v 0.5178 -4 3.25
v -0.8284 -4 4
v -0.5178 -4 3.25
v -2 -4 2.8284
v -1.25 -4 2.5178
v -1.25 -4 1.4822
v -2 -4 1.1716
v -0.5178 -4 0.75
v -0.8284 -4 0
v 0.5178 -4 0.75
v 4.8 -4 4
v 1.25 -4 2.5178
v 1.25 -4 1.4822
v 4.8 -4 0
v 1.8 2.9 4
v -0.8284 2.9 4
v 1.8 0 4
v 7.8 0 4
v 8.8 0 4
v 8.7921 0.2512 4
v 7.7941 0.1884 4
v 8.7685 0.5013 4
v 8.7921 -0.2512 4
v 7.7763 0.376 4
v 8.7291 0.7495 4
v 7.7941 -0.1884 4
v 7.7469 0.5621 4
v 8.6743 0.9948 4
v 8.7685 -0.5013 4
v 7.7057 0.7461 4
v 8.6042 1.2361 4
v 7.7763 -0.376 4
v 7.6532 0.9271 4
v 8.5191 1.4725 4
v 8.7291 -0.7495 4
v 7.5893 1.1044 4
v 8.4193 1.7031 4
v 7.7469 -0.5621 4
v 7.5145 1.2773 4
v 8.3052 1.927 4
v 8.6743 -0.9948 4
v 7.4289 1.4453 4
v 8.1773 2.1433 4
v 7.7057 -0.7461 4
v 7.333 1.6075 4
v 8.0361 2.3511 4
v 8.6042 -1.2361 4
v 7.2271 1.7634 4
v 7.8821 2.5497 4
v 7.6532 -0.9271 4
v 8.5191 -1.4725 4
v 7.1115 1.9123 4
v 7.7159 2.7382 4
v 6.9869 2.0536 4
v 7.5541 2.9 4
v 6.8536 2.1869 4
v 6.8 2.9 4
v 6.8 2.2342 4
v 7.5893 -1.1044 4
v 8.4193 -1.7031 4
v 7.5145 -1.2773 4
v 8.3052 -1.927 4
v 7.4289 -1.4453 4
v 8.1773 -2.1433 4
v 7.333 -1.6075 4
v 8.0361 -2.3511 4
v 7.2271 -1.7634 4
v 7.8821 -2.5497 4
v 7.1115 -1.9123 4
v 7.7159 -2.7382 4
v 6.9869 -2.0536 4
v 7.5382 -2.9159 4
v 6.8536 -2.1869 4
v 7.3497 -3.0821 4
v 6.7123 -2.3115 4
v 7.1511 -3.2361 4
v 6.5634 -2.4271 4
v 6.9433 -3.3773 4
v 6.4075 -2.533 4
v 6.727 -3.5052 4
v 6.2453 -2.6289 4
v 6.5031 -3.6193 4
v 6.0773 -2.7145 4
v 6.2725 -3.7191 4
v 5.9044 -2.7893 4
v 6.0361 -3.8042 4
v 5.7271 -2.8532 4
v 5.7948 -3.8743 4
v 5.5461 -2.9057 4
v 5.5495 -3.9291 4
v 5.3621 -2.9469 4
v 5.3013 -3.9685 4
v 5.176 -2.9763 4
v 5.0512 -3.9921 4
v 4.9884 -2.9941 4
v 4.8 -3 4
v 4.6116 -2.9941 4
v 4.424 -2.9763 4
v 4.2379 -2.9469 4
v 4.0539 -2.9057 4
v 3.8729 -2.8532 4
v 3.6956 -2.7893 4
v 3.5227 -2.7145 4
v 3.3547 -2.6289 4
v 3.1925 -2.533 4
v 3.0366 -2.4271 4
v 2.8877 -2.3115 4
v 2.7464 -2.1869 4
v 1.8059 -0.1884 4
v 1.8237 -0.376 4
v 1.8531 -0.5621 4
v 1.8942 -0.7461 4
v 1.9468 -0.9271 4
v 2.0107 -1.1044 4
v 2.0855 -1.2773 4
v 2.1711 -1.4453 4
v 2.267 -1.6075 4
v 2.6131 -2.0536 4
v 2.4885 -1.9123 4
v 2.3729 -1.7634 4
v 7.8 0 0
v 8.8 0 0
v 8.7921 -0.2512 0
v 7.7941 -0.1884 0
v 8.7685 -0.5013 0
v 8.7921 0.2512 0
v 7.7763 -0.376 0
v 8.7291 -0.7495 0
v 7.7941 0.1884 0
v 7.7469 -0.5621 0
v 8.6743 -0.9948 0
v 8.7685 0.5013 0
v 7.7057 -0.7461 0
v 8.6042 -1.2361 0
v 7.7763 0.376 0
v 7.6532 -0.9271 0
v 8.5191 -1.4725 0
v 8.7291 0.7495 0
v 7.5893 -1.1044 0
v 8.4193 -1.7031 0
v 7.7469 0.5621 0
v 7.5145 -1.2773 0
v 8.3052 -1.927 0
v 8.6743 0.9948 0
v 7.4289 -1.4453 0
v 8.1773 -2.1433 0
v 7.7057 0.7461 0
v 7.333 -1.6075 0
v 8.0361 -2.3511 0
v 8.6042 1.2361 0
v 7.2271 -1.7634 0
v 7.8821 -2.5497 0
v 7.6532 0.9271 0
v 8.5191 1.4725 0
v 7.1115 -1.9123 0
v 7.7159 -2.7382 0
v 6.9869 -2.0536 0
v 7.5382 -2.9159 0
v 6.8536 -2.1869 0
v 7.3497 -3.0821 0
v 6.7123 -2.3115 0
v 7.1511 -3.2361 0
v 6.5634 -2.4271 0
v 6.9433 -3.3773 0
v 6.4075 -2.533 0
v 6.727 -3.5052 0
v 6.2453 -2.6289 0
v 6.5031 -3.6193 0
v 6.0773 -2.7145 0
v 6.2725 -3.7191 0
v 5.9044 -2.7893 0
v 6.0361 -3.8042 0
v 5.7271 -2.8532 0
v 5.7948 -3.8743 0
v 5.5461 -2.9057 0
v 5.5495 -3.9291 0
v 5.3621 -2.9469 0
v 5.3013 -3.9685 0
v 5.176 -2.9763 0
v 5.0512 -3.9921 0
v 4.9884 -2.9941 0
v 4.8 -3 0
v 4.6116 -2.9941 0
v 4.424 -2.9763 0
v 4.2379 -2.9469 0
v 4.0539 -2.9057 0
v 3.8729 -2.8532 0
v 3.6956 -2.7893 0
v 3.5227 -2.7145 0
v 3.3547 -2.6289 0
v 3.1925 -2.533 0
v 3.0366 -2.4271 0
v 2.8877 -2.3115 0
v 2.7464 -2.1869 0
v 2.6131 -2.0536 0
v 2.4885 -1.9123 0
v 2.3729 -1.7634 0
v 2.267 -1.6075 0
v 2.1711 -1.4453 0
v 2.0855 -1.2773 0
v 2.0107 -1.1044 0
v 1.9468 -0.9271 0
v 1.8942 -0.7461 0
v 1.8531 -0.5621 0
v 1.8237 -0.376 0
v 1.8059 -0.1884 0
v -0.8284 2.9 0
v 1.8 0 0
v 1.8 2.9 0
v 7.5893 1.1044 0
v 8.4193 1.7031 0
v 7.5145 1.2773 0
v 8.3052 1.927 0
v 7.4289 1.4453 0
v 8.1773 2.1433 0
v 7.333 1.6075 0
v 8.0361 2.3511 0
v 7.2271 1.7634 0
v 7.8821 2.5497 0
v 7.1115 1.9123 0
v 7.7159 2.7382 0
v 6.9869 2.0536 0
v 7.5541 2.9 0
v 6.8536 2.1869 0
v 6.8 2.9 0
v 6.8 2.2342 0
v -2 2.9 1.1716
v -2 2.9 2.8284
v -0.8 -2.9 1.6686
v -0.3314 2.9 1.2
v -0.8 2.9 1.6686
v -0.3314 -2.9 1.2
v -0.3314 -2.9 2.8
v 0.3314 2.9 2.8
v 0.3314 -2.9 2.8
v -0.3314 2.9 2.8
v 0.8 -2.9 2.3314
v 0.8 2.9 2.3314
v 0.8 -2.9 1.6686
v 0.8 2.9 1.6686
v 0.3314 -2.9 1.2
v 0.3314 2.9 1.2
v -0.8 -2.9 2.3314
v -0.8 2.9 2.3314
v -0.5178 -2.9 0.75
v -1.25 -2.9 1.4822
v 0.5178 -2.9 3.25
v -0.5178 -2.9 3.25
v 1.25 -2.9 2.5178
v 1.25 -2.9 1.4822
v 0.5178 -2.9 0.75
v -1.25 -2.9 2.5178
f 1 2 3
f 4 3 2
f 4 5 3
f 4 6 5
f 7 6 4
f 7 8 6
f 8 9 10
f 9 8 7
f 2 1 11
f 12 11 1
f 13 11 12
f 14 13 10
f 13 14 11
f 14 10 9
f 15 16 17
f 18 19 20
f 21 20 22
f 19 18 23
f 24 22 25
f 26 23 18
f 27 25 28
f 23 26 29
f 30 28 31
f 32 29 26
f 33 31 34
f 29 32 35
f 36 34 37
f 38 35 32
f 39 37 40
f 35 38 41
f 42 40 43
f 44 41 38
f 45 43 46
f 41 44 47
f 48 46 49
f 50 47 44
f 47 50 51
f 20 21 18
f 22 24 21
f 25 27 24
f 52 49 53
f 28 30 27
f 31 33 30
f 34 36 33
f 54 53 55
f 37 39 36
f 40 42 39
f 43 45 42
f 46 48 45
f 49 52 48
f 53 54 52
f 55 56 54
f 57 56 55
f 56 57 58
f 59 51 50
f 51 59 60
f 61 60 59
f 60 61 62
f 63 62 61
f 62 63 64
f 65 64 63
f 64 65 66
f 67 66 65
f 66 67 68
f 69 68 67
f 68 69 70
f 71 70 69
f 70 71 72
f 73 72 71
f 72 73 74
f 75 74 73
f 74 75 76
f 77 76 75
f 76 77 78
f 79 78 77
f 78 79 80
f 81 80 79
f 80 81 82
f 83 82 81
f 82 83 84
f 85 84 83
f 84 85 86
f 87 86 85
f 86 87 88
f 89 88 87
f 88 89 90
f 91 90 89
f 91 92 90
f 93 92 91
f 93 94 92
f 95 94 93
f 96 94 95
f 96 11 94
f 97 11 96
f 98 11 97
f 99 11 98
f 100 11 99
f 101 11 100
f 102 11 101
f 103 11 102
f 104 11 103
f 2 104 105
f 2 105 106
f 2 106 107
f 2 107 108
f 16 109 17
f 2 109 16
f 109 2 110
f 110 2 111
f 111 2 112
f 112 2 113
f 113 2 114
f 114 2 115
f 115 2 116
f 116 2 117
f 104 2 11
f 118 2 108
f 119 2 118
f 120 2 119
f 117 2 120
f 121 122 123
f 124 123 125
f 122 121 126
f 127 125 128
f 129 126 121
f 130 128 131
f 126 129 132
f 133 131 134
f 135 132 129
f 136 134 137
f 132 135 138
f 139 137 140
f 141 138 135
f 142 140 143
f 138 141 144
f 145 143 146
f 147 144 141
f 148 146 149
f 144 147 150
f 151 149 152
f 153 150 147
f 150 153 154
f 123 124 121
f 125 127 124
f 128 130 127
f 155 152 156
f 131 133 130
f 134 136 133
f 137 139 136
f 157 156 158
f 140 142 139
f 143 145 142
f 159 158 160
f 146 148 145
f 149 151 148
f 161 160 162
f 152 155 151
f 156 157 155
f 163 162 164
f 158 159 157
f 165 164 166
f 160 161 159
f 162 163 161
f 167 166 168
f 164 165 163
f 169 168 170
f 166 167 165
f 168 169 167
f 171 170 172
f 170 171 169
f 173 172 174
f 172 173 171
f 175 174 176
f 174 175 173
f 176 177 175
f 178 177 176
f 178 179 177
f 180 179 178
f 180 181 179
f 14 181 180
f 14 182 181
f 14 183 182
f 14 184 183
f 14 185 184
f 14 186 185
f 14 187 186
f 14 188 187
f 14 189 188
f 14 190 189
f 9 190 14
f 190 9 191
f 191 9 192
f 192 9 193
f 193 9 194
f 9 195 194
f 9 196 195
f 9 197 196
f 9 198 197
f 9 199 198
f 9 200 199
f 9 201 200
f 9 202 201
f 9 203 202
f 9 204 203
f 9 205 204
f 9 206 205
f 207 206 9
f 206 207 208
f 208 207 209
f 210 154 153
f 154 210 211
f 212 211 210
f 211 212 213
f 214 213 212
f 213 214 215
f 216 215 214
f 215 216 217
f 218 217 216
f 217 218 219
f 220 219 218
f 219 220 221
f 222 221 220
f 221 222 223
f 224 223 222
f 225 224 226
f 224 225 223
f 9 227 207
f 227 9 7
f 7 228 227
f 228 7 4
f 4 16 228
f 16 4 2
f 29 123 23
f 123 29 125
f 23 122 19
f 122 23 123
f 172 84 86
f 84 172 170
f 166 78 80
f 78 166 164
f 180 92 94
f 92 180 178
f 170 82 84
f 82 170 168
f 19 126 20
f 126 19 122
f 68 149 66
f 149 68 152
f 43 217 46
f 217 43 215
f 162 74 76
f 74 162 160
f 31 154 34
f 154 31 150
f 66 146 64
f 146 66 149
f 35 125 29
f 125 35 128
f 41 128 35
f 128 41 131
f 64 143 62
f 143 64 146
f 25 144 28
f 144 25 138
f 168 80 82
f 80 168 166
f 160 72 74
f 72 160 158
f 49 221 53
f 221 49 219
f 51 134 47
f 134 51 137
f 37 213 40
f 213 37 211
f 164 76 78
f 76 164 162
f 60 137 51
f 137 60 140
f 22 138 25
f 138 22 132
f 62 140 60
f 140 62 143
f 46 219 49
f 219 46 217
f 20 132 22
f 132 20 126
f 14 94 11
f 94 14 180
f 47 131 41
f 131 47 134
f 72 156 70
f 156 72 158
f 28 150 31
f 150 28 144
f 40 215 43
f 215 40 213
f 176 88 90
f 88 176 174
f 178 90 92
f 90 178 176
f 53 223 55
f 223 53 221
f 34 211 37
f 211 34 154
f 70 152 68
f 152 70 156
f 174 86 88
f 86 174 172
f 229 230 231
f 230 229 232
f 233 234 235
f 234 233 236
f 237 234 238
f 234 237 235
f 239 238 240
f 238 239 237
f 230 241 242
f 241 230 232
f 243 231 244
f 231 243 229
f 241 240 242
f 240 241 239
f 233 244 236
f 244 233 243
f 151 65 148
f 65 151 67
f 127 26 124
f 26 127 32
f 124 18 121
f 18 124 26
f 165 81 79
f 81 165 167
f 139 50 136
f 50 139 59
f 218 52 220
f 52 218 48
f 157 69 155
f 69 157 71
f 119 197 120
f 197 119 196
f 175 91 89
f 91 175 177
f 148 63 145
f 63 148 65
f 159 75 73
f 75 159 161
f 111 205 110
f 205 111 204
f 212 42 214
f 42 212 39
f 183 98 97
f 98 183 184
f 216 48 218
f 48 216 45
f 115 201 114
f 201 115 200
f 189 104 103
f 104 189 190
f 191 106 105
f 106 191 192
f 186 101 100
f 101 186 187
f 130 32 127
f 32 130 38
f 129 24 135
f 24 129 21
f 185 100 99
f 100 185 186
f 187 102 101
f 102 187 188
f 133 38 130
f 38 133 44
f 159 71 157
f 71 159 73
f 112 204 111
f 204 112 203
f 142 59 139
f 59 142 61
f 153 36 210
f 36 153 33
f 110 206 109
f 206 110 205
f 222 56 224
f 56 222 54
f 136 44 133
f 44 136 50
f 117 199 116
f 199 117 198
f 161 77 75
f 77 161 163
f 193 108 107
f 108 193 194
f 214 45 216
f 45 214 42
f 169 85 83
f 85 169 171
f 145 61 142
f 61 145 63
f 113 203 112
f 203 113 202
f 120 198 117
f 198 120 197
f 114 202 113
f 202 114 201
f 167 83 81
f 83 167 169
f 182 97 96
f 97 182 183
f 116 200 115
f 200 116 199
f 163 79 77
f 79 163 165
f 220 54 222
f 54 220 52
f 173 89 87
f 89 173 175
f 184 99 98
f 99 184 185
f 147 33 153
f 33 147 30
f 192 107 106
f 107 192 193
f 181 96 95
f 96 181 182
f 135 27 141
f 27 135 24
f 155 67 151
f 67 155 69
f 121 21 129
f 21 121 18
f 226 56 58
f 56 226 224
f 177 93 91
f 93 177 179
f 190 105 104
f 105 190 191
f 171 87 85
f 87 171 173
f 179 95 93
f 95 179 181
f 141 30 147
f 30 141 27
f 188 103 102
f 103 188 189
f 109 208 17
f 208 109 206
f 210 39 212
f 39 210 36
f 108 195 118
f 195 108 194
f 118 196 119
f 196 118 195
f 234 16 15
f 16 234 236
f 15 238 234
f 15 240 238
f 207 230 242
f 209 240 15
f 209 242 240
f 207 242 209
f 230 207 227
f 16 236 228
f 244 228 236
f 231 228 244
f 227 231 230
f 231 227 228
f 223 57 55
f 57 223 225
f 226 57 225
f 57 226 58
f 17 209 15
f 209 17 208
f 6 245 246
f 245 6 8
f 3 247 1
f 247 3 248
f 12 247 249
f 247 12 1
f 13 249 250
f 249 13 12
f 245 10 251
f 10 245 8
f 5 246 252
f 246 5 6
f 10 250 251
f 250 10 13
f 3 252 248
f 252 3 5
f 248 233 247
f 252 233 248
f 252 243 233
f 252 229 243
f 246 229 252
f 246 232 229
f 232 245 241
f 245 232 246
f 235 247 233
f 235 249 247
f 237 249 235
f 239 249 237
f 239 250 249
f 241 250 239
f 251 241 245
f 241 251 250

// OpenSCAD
// ************* Credits part *************

// "Customizable Cable Holder" 

// Programmed by Fryns - September 2014

// Optimized for Customizer 

// ************* Declaration part *************

/* [Dimensions] */
// Width of hanger in mm
Width=4;
NailDiameter=1.6; // Nail or Screw Diameter
CableDiameter=6.0;
Thickness=1;

/* [Advanced] */
CutLengthBottom=0.1; // from -Thickness to CableDiameter
CutLengthSide=1; // from 0 to CableDiameter
Resolution=100; //[20:Draft,50:Medium,100:Fine, 200:very fine]
Geometry=8; //[8:Obey rule of 45,100:Fine, 200:very fine]

/* [Countersink] */
NailHeadDiameter=2.5;
CountersinkDepth=1.2;
Countersink="Normal"; // [Normal,No Countersink,Angle]

/* [Hidden] */
Manifoldfix=0.1;

// ************* Executable part *************
translate([0,0,Width/2])
rotate(a=[90,0,0])
difference(){
	BaseVolume();
	CutVolume();
	if (Countersink=="Angle") CountersinkAngle();
	if (Countersink=="Normal") Countersink();
}

// ************* Module part *************

module BaseVolume(){
//Base ensuring plane top
   translate([(NailDiameter/2+CableDiameter/2+Thickness)/2,0,0])
		cube(size = [NailDiameter/2+CableDiameter/2+Thickness,Width,CableDiameter+2*Thickness], center = true);

//Base head for Nail
	rotate(a=[0,0,360/(Geometry*2)])
		cylinder(h = CableDiameter+2*Thickness, r = Width/2/cos(360/(Geometry*2)),$fn=Geometry, center = true);

//Base for cable
   translate([NailDiameter/2+CableDiameter/2+Thickness,0,0])
		rotate(a=[90,0,0])
			cylinder(h = Width, r = (CableDiameter+2*Thickness)/2,$fn=Resolution, center = true);
}

module CutVolume(){
// cut-cylinder for Nail
	rotate(a=[0,0,360/(8*2)])
		cylinder(h = CableDiameter+2*Thickness+Manifoldfix, r = NailDiameter/2/cos(360/(Geometry*2)),$fn=Geometry, center = true);

// cut-cylinder for cable
   translate([NailDiameter/2+CableDiameter/2+Thickness,0,0])
		rotate(a=[90,0,0])
		cylinder(h = Width+2*Manifoldfix, r = (CableDiameter)/2,$fn=Resolution, center = true);

// cut-cube Bottom
   translate([(Width+CableDiameter+2*Thickness)/2-Width/2-Manifoldfix,0,CutLengthBottom+Thickness-(CableDiameter+2*Thickness)])
		cube(size = [Width+CableDiameter+2*Thickness,Width+Manifoldfix,CableDiameter+2*Thickness], center = true);

// cut-cube Side
   translate([NailDiameter/2+(CableDiameter-CutLengthSide)/2+Thickness,0,-(CableDiameter+2*Thickness)/2])
		cube(size = [CableDiameter-CutLengthSide,Width+Manifoldfix,CableDiameter+2*Thickness], center = true);
}

module Countersink(){	// Normal countersink for nail head
   translate([0,0,(CableDiameter+2*Thickness)/2-CountersinkDepth+Manifoldfix])
		rotate(a=[0,0,360/(Geometry*2)])
			cylinder(h = CountersinkDepth, r = NailHeadDiameter/2/cos(360/(Geometry*2)),$fn=Geometry, center = false);
}

module CountersinkAngle(){ // Angle countersink for screw head
   translate([0,0,(CableDiameter+2*Thickness)/2-(NailHeadDiameter/2-NailDiameter/2)+Manifoldfix])
		cylinder(h = NailHeadDiameter/2-NailDiameter/2, r1 = NailDiameter/2,r2 = NailHeadDiameter/2,$fn=Resolution, center = false);
}
